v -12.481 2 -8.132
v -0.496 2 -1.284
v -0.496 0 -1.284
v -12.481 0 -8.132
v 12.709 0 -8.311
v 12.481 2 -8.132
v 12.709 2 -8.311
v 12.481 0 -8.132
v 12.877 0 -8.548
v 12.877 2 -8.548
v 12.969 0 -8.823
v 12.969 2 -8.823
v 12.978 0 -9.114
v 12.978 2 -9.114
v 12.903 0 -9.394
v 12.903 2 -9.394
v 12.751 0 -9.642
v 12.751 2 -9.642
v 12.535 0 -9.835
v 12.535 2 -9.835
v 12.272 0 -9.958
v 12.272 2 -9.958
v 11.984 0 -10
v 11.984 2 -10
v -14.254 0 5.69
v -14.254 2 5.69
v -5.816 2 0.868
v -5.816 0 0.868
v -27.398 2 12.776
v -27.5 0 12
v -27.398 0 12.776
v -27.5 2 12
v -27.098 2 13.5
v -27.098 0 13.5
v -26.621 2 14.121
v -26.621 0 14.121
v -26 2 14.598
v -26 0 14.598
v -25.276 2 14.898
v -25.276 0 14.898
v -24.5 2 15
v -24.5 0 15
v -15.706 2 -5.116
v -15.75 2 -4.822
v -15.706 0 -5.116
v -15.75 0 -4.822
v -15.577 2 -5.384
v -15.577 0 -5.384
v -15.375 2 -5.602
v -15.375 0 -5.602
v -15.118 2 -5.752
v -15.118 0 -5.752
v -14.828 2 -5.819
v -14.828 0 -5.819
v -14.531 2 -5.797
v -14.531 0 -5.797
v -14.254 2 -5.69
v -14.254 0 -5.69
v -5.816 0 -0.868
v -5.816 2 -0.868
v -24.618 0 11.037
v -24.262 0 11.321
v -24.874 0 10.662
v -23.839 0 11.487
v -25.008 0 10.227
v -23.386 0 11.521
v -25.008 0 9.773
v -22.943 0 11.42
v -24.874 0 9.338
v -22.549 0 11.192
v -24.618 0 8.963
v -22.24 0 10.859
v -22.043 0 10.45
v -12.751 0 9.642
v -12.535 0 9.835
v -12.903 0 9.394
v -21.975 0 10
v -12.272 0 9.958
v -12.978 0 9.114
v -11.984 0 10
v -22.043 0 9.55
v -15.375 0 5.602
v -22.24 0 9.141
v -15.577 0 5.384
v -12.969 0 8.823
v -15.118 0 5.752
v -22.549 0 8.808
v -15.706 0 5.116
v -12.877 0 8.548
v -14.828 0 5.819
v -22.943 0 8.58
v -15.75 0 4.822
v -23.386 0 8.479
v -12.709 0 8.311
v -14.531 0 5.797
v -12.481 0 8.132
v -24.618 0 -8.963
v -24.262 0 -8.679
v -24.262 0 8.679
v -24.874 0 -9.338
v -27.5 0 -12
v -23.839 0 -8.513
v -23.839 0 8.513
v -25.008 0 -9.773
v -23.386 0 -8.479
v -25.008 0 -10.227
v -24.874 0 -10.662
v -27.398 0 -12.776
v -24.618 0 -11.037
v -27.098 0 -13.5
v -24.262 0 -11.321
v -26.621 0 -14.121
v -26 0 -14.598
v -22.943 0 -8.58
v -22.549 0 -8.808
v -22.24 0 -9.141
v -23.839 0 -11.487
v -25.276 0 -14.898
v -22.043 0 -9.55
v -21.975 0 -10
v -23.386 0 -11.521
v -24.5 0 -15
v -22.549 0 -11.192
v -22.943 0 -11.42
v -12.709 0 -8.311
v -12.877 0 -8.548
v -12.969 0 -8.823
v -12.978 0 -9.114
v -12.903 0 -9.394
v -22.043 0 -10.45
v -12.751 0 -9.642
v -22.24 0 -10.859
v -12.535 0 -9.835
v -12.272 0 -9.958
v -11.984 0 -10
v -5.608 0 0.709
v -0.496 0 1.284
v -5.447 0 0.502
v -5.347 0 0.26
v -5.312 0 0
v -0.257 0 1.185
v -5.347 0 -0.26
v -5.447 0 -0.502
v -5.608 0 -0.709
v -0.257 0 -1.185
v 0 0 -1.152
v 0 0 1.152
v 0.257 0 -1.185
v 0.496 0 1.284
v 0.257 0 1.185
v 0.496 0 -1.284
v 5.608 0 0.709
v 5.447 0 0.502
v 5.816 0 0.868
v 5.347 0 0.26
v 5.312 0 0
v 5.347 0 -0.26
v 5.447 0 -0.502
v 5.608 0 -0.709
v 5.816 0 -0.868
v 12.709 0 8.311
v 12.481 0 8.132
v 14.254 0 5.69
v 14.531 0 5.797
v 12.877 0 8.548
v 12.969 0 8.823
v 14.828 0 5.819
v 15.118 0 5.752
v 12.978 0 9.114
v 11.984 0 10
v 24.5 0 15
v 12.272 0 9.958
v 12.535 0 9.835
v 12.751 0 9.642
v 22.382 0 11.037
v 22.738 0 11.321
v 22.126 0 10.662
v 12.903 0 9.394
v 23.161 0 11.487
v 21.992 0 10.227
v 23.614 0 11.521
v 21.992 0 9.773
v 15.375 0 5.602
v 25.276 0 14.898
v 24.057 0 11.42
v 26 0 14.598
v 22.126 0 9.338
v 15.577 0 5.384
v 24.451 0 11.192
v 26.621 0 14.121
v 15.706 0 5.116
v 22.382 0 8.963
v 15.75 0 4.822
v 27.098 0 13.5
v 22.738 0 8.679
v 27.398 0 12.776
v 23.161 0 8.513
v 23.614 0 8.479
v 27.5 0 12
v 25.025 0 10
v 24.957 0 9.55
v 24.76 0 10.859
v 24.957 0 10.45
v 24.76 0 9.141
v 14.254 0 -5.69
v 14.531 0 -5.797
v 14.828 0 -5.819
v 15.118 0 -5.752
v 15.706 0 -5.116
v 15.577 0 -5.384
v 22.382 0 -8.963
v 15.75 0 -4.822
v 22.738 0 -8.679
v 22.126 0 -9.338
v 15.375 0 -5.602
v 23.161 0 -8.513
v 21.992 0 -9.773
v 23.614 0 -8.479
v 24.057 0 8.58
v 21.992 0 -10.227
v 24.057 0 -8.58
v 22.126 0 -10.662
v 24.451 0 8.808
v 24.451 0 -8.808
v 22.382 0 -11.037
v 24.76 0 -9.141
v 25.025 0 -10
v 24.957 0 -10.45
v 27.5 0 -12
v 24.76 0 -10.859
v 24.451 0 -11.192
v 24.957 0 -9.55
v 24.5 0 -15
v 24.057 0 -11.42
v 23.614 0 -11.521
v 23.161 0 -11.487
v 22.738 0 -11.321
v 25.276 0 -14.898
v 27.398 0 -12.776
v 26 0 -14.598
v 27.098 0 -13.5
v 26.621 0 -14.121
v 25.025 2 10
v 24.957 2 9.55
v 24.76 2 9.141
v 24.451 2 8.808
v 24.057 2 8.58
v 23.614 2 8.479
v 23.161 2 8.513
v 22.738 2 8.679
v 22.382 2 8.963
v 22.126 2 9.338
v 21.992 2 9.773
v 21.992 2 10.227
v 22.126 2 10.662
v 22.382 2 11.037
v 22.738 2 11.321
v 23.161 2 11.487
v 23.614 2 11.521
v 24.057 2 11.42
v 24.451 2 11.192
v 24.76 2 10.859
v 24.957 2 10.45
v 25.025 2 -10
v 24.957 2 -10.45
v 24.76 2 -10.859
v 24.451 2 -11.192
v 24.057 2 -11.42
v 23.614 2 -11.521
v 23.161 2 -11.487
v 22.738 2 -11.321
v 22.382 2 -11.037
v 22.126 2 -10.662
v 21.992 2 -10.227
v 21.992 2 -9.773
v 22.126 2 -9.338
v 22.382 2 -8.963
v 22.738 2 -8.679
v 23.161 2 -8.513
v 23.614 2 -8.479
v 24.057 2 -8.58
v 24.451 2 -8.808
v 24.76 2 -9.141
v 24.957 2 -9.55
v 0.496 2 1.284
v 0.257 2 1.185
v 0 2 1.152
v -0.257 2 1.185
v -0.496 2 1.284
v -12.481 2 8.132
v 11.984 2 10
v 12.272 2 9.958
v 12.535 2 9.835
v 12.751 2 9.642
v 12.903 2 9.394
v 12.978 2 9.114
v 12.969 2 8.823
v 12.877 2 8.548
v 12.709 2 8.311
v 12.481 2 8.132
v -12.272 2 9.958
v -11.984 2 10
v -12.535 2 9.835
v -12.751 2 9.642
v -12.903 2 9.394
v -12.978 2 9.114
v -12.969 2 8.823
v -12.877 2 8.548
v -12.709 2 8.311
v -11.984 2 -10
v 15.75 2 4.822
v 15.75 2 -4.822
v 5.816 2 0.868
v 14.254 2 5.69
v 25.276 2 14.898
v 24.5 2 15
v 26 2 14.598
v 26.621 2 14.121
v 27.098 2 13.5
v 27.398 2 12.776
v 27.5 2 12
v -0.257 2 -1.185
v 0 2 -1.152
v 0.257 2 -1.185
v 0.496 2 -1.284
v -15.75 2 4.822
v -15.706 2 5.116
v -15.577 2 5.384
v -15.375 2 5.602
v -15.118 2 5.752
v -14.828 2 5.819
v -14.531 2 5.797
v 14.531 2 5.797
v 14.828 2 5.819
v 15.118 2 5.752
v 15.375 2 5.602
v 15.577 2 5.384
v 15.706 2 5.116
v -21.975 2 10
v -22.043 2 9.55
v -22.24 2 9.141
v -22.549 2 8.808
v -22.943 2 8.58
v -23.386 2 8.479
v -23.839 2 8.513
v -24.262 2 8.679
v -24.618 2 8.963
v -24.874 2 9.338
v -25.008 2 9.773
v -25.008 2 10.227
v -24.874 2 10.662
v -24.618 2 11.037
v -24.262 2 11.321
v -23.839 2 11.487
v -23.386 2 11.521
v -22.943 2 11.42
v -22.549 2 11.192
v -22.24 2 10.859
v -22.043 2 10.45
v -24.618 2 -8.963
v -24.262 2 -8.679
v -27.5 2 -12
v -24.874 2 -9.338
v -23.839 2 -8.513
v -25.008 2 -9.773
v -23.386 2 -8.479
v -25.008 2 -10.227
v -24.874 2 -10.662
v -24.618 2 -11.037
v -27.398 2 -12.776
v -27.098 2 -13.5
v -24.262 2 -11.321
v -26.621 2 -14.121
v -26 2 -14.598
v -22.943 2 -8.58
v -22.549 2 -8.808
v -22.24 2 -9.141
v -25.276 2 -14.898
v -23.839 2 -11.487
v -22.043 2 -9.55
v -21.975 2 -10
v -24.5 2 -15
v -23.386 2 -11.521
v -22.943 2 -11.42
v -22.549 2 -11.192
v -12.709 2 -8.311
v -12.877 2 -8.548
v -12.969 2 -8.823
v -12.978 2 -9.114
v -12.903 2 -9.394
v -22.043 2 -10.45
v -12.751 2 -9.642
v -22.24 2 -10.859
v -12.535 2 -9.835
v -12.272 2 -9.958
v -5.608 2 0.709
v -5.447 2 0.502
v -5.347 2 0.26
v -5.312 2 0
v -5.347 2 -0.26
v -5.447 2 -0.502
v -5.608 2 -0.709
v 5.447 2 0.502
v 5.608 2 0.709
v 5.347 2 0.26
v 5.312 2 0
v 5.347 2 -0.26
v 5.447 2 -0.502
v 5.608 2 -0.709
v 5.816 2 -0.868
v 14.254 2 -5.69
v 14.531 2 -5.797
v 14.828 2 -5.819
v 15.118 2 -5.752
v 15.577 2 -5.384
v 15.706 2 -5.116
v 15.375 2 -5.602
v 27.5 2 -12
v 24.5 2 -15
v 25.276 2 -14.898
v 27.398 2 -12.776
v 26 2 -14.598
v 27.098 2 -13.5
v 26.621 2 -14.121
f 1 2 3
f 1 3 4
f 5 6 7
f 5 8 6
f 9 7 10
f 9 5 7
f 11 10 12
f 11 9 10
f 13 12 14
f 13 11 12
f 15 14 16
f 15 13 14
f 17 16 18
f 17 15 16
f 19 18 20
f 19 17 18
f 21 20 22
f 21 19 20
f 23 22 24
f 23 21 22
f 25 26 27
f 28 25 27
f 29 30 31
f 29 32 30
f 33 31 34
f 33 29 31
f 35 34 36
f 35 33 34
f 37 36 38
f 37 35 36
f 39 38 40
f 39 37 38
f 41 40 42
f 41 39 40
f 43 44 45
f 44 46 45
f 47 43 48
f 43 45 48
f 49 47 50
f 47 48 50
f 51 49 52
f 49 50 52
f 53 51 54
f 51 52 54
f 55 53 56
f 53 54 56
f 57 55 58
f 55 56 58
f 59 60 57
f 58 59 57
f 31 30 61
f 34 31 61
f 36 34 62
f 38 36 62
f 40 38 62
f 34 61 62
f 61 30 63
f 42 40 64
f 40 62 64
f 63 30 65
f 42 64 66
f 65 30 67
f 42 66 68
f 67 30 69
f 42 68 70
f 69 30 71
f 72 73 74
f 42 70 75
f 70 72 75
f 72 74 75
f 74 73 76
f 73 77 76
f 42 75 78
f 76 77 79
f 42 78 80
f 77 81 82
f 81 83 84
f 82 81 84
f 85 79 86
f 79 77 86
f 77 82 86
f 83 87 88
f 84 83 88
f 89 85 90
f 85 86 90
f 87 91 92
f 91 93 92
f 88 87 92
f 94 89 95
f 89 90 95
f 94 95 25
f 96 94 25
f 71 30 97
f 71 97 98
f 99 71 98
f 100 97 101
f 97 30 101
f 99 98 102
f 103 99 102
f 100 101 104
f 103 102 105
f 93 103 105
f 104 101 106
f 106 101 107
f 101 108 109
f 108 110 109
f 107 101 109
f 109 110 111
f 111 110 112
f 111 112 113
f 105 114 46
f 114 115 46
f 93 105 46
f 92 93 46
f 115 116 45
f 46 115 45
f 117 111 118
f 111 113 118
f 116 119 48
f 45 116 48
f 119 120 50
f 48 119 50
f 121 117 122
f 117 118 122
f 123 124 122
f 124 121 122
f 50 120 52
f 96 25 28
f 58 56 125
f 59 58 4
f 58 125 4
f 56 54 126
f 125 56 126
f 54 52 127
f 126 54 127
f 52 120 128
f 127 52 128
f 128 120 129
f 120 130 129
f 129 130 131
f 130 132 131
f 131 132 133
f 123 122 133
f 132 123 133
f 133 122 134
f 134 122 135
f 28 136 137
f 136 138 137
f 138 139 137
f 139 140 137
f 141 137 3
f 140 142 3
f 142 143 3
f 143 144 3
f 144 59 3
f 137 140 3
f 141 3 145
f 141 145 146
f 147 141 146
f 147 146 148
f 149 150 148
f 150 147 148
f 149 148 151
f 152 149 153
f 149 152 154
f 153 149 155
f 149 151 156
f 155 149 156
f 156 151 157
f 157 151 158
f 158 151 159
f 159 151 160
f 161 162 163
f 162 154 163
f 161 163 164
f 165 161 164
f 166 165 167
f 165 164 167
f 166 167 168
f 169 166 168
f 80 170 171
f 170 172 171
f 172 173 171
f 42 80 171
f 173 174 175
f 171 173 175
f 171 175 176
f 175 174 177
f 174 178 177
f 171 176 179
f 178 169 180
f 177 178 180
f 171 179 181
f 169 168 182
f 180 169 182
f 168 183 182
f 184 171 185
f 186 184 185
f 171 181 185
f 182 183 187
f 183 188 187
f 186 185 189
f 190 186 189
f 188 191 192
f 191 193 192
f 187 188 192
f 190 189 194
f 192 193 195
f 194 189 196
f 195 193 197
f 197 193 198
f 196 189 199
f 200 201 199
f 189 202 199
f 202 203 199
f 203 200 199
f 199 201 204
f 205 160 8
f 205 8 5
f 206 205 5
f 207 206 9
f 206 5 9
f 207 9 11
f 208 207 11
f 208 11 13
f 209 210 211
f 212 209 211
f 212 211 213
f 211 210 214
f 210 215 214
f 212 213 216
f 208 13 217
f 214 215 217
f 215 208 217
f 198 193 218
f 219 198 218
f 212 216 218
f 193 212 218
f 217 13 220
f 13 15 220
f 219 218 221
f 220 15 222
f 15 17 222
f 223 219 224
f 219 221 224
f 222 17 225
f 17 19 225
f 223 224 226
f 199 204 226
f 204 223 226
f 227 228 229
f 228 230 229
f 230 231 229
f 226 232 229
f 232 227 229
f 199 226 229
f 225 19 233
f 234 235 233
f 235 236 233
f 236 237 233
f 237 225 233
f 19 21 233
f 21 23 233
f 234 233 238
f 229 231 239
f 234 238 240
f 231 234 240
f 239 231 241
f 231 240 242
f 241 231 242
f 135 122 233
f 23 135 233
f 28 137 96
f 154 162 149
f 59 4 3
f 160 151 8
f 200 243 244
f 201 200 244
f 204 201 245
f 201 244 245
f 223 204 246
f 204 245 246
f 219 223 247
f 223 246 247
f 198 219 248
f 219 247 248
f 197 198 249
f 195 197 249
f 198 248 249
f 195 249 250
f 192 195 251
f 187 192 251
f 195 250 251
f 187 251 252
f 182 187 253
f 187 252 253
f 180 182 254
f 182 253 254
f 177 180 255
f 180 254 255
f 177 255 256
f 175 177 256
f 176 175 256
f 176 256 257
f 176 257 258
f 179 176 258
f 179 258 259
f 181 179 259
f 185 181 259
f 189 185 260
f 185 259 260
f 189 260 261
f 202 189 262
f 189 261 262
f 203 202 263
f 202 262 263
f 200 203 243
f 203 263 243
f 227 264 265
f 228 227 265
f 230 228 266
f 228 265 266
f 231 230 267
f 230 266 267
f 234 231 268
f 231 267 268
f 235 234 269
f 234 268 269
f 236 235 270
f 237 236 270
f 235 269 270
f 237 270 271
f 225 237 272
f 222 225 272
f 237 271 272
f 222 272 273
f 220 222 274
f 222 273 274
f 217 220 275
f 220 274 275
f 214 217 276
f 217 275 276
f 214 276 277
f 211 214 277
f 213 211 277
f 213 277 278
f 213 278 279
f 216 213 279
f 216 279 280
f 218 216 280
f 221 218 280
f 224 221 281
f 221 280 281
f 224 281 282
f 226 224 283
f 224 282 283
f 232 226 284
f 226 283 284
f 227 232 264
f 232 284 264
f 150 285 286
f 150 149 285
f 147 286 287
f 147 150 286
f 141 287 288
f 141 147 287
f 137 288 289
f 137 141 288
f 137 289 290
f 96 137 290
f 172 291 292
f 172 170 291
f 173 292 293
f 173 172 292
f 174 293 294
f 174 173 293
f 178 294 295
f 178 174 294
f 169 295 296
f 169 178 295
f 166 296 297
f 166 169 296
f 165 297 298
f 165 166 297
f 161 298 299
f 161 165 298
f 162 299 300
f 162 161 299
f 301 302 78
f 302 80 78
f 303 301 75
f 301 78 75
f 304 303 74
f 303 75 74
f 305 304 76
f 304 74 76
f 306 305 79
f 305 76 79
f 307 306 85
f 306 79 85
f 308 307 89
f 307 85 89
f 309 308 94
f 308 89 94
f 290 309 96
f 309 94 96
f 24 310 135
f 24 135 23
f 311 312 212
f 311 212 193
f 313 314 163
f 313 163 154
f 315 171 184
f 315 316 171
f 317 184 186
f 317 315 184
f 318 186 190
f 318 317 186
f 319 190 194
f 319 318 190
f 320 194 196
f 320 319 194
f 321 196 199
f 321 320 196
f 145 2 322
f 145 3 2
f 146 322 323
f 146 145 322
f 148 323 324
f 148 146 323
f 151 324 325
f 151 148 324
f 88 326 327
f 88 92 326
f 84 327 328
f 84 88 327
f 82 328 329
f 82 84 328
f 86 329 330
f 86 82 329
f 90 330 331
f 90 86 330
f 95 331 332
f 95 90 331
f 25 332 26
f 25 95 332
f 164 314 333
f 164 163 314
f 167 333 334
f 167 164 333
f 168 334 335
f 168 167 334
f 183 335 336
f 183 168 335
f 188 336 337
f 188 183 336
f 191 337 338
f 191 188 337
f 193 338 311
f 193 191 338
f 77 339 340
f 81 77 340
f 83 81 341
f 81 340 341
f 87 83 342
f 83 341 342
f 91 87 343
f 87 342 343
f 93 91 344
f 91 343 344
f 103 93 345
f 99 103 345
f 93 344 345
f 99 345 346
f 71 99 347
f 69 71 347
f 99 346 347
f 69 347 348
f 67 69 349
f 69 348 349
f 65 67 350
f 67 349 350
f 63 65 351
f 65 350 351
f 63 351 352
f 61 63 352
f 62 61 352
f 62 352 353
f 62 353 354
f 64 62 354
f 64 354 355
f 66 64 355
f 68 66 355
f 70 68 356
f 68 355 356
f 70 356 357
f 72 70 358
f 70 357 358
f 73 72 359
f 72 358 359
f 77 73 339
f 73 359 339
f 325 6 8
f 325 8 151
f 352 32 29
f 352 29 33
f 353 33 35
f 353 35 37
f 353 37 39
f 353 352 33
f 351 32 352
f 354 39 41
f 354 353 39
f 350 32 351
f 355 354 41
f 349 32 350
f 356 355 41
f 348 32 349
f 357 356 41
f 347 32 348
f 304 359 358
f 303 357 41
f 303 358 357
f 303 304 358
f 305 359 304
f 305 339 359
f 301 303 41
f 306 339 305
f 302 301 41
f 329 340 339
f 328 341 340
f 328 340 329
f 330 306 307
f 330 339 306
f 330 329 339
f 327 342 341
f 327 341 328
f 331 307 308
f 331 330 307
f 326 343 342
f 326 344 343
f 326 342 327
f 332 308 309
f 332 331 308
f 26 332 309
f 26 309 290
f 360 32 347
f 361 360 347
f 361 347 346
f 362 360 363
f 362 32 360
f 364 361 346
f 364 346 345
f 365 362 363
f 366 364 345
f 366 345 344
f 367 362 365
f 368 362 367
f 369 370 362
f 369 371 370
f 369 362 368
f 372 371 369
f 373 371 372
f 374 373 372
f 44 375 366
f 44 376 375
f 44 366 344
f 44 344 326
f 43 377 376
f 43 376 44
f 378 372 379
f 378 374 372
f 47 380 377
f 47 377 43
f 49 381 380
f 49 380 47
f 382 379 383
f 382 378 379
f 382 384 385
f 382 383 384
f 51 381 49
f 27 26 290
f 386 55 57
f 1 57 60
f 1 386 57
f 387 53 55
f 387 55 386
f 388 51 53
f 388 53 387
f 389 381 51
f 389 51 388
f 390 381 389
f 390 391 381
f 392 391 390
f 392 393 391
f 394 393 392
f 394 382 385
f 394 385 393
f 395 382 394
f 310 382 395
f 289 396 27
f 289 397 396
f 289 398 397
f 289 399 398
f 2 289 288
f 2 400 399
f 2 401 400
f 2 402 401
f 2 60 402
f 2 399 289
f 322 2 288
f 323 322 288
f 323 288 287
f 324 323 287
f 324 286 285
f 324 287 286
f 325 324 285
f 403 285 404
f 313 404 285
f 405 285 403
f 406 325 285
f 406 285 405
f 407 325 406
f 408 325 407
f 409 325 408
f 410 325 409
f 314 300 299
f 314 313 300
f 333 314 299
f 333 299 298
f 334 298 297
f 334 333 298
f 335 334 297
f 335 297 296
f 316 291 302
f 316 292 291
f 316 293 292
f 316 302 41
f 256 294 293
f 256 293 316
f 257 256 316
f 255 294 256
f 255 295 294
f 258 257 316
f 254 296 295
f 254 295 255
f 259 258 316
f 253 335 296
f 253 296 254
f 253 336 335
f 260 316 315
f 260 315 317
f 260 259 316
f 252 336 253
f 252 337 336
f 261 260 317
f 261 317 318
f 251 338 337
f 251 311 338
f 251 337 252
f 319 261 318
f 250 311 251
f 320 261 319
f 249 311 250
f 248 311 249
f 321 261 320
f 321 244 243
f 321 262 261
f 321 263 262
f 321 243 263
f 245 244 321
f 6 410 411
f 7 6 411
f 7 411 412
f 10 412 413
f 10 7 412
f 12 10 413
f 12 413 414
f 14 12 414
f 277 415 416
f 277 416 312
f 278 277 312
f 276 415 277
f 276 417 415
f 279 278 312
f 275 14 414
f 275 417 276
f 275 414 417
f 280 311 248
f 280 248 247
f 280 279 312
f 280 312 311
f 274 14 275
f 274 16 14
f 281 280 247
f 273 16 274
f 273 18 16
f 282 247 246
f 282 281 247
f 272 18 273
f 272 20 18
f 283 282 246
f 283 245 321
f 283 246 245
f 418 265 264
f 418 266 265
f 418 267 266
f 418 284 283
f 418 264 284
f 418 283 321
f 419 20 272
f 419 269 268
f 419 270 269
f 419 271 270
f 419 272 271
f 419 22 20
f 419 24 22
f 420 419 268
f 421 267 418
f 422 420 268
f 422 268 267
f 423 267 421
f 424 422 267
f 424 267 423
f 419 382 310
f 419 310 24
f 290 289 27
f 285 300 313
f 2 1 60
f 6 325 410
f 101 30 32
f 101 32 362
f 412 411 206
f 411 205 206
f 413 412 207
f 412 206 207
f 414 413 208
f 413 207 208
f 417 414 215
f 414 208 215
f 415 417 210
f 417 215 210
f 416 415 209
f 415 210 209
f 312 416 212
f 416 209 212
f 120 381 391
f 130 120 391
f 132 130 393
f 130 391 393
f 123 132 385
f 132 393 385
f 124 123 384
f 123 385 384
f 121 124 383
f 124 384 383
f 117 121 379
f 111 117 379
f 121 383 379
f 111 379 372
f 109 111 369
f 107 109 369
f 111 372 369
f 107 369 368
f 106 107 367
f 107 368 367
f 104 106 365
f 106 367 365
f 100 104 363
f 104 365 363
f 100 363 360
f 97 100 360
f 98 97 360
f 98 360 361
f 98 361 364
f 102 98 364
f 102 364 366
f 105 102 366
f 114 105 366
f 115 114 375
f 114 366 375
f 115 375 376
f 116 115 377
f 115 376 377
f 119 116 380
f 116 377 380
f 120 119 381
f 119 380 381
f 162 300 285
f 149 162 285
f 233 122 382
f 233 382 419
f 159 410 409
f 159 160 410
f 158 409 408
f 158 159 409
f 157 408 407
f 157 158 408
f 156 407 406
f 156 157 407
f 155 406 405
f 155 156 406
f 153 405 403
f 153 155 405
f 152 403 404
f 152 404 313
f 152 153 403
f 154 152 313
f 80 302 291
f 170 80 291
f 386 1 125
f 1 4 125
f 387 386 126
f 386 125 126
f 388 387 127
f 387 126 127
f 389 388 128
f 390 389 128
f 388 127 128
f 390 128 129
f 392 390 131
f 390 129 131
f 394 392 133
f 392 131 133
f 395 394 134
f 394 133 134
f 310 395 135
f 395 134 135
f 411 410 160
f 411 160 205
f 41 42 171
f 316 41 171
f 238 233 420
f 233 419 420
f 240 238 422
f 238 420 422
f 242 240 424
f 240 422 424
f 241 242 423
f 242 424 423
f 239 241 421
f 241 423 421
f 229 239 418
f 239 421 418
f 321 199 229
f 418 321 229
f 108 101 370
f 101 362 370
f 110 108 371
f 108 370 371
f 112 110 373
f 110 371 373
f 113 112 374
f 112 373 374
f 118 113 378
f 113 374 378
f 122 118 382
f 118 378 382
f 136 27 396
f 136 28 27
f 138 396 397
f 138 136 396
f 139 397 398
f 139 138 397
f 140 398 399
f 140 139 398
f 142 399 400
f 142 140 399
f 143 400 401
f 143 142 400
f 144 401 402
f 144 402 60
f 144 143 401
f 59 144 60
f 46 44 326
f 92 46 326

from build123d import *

# Parameters (mm, degrees)
SKETCH_1_W          = 55
SKETCH_1_H          = 30
EXTRUDE_1_DEPTH     = 2
SKETCH_2_R          = 1.525
CUT_EXTRUDE_1_DEPTH = 2
FILLET_1_R          = 3
CUT_EXTRUDE_2_DEPTH = 2
FILLET_2_R          = 1


with BuildPart() as part:
    # 草图1 → 凸台-拉伸1 (new body)
    with BuildSketch(Plane(origin=(0, 0, 0), x_dir=(1, 0, 0), z_dir=(0, 1, 0))):
        Rectangle(SKETCH_1_W, SKETCH_1_H)
    extrude(amount=EXTRUDE_1_DEPTH)

    # 草图2 → 切除-拉伸1 (cut)
    with BuildSketch(Plane(origin=(0, 2, 0), x_dir=(1, 0, 0), z_dir=(0, 1, 0))):
        with Locations((-23.5, 10)):
            Circle(SKETCH_2_R)
        with Locations((-23.5, -10)):
            Circle(SKETCH_2_R)
        with Locations((23.5, -10)):
            Circle(SKETCH_2_R)
        with Locations((23.5, 10)):
            Circle(SKETCH_2_R)
    extrude(amount=-CUT_EXTRUDE_1_DEPTH, mode=Mode.SUBTRACT)

    # 圆角1
    fillet_1_edges = [part.edges().sort_by_distance(p)[0] for p in [
        (27.5, 1, 15),
        (-27.5, 1, 15),
        (-27.5, 1, -15),
        (27.5, 1, -15),
    ]]
    fillet(fillet_1_edges, radius=FILLET_1_R)

    # 草图3 → 切除-拉伸2 (cut)
    with BuildSketch(Plane(origin=(0, 2, 0), x_dir=(1, 0, 0), z_dir=(0, 1, 0))):
        Polygon((-15.75, 10), (15.75, 10), (0, 1), align=None)
        Polygon((-15.75, 6.544746679), (-15.75, -6.544746679), (-4.296693311, 0), align=None)
        Polygon((-15.75, -10), (15.75, -10), (0, -1), align=None)
        Polygon((15.75, 6.544746679), (15.75, -6.544746679), (4.296693311, 0), align=None)
    extrude(amount=-CUT_EXTRUDE_2_DEPTH, mode=Mode.SUBTRACT)

    # 圆角2
    fillet_2_edges = [part.edges().sort_by_distance(p)[0] for p in [
        (15.75, 1, 10),
        (0, 1, 1),
        (-15.75, 1, 10),
        (-15.75, 1, 6.544746679),
        (-4.296693311, 1, 0),
        (-15.75, 1, -6.544746679),
        (15.75, 1, 6.544746679),
        (15.75, 1, -6.544746679),
        (4.296693311, 1, 0),
        (15.75, 1, -10),
        (-15.75, 1, -10),
        (0, 1, -1),
    ]]
    fillet(fillet_2_edges, radius=FILLET_2_R)


solid = part.part
